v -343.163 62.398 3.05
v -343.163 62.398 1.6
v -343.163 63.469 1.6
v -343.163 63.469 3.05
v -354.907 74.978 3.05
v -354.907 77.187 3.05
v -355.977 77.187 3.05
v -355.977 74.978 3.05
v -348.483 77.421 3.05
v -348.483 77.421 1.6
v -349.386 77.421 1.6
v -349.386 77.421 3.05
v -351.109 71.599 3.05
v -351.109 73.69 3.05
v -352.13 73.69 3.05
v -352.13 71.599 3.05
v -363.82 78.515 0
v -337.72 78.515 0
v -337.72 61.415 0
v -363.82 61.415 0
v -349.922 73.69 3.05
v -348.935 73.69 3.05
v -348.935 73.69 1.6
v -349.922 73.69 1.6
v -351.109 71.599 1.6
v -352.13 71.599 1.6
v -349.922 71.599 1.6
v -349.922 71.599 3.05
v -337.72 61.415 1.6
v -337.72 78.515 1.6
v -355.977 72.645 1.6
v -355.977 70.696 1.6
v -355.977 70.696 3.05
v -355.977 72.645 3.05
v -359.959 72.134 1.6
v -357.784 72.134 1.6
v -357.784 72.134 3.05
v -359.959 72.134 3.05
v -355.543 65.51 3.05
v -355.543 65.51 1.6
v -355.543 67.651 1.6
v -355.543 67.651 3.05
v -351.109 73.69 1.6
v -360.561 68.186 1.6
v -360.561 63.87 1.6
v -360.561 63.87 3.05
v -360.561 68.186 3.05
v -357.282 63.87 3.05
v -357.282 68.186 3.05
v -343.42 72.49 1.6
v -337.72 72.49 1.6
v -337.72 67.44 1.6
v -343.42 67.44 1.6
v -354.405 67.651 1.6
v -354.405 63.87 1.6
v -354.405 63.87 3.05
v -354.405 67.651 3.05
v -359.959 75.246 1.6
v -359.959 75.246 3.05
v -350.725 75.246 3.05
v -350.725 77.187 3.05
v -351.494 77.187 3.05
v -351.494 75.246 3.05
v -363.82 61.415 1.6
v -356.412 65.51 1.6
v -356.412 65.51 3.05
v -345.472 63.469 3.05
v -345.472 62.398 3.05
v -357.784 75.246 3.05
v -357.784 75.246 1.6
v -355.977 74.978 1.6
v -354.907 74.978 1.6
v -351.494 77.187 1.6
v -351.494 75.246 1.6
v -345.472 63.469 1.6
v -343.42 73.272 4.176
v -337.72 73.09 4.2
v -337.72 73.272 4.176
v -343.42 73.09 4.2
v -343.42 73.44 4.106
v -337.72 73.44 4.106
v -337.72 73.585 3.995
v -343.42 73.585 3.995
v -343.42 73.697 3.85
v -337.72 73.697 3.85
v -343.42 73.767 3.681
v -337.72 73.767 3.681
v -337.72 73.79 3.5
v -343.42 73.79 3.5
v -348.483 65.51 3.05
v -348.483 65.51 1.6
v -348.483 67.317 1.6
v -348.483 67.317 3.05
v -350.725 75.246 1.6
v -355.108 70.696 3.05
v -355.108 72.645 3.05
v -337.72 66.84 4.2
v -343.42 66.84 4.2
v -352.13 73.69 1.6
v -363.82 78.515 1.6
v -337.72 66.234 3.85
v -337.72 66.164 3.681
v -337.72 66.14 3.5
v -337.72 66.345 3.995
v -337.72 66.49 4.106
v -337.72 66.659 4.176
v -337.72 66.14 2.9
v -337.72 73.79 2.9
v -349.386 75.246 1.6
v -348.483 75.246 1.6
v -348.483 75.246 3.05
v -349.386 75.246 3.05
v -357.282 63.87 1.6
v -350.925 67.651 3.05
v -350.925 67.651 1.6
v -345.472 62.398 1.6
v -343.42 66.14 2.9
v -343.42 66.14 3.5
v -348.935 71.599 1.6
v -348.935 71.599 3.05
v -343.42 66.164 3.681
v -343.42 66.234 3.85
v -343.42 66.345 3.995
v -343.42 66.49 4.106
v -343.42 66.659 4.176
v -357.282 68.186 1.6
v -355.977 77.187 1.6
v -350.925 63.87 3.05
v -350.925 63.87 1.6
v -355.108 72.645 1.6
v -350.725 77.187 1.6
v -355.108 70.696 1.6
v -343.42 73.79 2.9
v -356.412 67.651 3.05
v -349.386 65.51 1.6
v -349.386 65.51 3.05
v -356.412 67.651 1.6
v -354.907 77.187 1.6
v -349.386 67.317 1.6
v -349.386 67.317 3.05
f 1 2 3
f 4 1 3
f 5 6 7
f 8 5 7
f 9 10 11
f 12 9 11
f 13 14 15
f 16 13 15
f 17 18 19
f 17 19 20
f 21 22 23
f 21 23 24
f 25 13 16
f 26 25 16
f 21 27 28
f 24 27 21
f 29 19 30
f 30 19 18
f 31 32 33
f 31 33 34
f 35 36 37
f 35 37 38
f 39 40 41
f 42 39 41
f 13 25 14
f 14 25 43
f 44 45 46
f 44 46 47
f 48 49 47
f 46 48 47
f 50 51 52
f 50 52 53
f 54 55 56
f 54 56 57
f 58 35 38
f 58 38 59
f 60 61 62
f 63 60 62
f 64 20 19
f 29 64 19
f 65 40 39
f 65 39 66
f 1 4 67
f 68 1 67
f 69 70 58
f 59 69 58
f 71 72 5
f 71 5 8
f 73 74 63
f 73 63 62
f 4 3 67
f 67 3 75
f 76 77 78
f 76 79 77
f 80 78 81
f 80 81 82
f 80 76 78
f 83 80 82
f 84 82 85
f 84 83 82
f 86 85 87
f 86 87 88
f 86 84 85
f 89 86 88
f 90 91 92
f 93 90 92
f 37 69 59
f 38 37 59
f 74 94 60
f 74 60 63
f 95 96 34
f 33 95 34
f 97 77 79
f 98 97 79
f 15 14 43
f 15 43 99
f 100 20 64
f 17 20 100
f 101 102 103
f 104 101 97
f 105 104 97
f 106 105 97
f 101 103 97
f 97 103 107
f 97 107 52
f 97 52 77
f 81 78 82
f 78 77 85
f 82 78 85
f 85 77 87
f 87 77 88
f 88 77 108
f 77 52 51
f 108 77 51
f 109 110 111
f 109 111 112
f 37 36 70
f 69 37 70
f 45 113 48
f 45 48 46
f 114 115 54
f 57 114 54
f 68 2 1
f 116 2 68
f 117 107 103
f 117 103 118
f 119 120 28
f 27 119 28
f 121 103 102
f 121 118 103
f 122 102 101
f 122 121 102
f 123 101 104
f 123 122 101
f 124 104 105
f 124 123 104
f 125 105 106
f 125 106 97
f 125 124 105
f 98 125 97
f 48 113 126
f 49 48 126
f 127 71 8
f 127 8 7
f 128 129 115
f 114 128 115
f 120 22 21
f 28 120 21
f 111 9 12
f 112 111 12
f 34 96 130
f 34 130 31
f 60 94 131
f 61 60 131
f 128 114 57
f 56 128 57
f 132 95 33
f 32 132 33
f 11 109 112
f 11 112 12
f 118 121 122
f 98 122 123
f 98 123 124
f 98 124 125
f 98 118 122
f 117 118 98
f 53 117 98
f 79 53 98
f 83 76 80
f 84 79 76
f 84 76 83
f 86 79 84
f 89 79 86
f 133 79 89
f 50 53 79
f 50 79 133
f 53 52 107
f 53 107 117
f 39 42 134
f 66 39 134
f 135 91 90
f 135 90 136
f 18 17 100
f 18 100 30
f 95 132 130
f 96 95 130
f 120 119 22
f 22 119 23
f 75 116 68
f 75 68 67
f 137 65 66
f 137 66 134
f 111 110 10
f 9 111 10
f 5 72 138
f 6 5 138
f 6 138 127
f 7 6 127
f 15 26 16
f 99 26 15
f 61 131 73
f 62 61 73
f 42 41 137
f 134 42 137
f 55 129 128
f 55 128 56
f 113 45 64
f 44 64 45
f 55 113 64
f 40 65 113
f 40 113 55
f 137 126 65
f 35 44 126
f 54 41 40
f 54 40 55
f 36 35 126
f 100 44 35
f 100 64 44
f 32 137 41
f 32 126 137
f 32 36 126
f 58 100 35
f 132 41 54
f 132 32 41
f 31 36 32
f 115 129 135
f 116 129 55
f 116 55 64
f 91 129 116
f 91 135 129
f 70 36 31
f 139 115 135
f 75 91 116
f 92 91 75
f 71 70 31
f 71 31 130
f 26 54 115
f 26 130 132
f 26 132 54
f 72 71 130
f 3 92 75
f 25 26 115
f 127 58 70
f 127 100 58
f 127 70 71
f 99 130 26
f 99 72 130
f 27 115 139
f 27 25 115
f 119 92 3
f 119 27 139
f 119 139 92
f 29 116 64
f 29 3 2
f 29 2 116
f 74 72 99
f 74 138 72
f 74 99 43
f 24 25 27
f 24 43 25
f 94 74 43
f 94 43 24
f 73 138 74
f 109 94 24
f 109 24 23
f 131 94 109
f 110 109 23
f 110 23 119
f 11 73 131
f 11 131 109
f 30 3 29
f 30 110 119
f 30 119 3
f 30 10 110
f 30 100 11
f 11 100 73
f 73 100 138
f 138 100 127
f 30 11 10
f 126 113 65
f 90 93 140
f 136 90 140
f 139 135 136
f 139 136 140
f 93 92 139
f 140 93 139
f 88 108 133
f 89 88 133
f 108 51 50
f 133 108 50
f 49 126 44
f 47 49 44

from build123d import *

# Parameters (mm, degrees)
SKETCH_1_W      = 26.1
SKETCH_1_H      = 17.1
EXTRUDE_1_DEPTH = 1.6
EXTRUDE_START   = -1.6
SKETCH_2_W      = 5.7
SKETCH_2_H      = 7.65
EXTRUDE_2_DEPTH = 2.6
SKETCH_2_3_W    = 2.174780603
SKETCH_2_3_H    = 3.11160917
SKETCH_2_3_W_2  = 1.07066122
SKETCH_2_3_H_2  = 2.208238767
SKETCH_2_3_W_3  = 0.769537752
SKETCH_2_3_H_3  = 1.940573462
SKETCH_2_3_W_4  = 0.903370404
SKETCH_2_3_H_4  = 2.174780604
SKETCH_2_3_W_5  = 0.987015812
SKETCH_2_3_H_5  = 2.091135195
SKETCH_2_3_W_6  = 0.869912241
SKETCH_2_3_H_6  = 1.948938002
SKETCH_2_3_W_7  = 3.278899986
SKETCH_2_3_H_7  = 4.316103044
SKETCH_2_3_W_8  = 0.869912242
SKETCH_2_3_H_8  = 2.14132244
SKETCH_2_3_W_9  = 3.479648965
SKETCH_2_3_H_9  = 3.780772434
SKETCH_2_3_H_10 = 1.806740808
SKETCH_2_3_W_10 = 2.308613255
SKETCH_2_3_H_11 = 1.07066122
SKETCH_2_3_W_11 = 1.020473975
EXTRUDE_3_DEPTH = 3.05
CHAMFER_1_SIZE  = 1.3
FILLET_1_R      = 0.7


with BuildPart() as part:
    # Эскиз1 → Бобышка-Вытянуть1 (new body)
    with BuildSketch(Plane.XY):
        with Locations((-350.770289691, 69.965387452)):
            Rectangle(SKETCH_1_W, SKETCH_1_H)
    extrude(amount=EXTRUDE_1_DEPTH)

    # Эскиз2<3> → Бобышка-Вытянуть3 (add)
    with BuildSketch(Plane(origin=(0, 0, 0), x_dir=(-1, 0, 0), z_dir=(0, 0, -1))):
        with Locations((358.871593715, 73.690295836)):
            Rectangle(SKETCH_2_3_W, SKETCH_2_3_H)
        with Locations((355.442131994, 76.0825545)):
            Rectangle(SKETCH_2_3_W_2, SKETCH_2_3_H_2)
        with Locations((351.109299869, 76.216387152)):
            Rectangle(SKETCH_2_3_W_3, SKETCH_2_3_H_3)
        with Locations((348.934519266, 76.333490723)):
            Rectangle(SKETCH_2_3_W_4, SKETCH_2_3_H_4)
        with Locations((349.428027172, 72.644728238)):
            Rectangle(SKETCH_2_3_W_5, SKETCH_2_3_H_5)
        with Locations((355.542506484, 71.670259237)):
            Rectangle(SKETCH_2_3_W_6, SKETCH_2_3_H_6)
        with Locations((358.921780959, 66.02837648)):
            Rectangle(SKETCH_2_3_W_7, SKETCH_2_3_H_7)
        with Locations((355.977462604, 66.580436172)):
            Rectangle(SKETCH_2_3_W_8, SKETCH_2_3_H_8)
        with Locations((352.665104455, 65.760711175)):
            Rectangle(SKETCH_2_3_W_9, SKETCH_2_3_H_9)
        with Locations((348.934519266, 66.413145356)):
            Rectangle(SKETCH_2_3_W_4, SKETCH_2_3_H_10)
        with Locations((344.317292755, 62.933496391)):
            Rectangle(SKETCH_2_3_W_10, SKETCH_2_3_H_11)
        with Locations((351.619536857, 72.644728238)):
            Rectangle(SKETCH_2_3_W_11, SKETCH_2_3_H_5)
    extrude(amount=-EXTRUDE_3_DEPTH)


with BuildPart() as body_2:
    # Эскиз2 → Бобышка-Вытянуть2 (new body)
    with BuildSketch(Plane(origin=(0, 0, 0), x_dir=(-1, 0, 0), z_dir=(0, 0, -1)).offset(EXTRUDE_START)):
        with Locations((340.570289691, 69.965387452)):
            Rectangle(SKETCH_2_W, SKETCH_2_H)
    extrude(amount=-EXTRUDE_2_DEPTH)

    # Фаска1
    chamfer_1_edges = [body_2.edges().sort_by_distance(p)[0] for p in [
        (-340.570289691, 73.790387452, 1.6),
        (-340.570289691, 66.140387452, 1.6),
    ]]
    chamfer(chamfer_1_edges, length=CHAMFER_1_SIZE)

    # Скругление1
    fillet_1_edges = [body_2.edges().sort_by_distance(p)[0] for p in [
        (-340.570289691, 73.790387452, 4.2),
        (-340.570289691, 66.140387452, 4.2),
    ]]
    fillet(fillet_1_edges, radius=FILLET_1_R)


solid = Compound([part.part, body_2.part])
